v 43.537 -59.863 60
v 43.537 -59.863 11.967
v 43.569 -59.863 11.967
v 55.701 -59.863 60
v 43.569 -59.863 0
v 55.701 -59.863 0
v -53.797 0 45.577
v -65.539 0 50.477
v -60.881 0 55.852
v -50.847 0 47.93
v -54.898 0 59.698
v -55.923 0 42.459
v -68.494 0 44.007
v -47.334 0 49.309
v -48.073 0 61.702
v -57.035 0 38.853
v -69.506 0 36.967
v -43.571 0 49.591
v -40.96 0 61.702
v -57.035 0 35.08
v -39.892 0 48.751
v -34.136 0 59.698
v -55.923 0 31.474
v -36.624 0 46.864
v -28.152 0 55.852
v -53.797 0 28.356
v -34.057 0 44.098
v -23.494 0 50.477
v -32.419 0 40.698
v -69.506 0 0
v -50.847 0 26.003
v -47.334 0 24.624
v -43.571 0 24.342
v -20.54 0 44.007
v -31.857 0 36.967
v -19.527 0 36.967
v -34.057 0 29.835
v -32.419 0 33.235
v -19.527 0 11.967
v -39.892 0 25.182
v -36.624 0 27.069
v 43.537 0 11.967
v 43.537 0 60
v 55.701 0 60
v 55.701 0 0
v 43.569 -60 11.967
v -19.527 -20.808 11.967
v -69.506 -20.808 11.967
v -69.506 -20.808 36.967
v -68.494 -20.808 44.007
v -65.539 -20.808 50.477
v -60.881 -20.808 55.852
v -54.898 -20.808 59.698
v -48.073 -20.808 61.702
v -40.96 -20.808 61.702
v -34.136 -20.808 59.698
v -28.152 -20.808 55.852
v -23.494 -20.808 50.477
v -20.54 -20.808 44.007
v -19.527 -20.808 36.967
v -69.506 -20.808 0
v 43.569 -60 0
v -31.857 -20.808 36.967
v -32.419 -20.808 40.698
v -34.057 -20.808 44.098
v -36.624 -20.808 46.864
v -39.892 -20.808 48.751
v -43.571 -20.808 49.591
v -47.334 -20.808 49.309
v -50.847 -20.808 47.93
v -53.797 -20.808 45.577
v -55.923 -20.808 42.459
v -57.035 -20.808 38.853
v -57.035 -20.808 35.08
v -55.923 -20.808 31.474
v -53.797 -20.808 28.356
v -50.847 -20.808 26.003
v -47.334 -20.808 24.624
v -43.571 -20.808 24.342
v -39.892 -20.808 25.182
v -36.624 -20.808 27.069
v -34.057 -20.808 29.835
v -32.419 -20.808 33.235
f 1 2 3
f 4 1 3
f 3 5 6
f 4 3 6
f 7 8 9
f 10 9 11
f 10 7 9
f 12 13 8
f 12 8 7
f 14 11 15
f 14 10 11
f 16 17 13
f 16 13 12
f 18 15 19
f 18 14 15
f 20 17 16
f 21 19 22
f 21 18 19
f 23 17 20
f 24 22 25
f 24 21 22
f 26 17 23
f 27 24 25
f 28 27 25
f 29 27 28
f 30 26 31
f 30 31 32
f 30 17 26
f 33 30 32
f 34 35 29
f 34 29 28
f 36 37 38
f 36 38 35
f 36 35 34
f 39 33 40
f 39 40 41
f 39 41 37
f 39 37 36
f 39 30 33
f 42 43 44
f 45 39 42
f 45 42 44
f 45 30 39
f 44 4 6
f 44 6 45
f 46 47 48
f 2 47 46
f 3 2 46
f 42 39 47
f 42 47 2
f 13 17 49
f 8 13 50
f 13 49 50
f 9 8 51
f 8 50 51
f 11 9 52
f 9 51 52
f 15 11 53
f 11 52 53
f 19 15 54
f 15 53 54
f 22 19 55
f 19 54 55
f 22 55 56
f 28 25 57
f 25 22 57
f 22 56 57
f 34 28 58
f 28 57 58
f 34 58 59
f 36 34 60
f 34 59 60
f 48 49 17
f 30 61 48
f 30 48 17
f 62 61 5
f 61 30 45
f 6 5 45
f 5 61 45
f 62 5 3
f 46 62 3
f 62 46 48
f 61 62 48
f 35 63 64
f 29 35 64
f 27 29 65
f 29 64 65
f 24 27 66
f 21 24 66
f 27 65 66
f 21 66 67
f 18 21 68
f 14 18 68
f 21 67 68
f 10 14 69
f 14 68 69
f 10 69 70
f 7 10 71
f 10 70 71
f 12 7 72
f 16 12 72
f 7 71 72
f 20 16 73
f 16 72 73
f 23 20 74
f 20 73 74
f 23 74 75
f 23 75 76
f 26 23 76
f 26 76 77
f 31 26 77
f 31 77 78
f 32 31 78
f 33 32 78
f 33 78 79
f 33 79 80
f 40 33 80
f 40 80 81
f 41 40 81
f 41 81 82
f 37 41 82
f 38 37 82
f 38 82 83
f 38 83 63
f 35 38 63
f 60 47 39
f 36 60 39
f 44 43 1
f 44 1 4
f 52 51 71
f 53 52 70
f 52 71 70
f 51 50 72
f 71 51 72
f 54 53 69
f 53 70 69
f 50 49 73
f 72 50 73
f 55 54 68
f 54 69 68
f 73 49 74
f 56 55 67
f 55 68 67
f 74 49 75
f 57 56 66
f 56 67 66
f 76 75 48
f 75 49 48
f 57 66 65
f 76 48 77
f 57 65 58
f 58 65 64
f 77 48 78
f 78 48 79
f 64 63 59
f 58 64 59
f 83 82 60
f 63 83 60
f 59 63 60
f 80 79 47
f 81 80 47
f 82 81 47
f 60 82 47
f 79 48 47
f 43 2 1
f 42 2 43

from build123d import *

# Parameters (mm, degrees)
F0_W      = 113.0752004683
F0_H      = 11.9665954262
F1_DEPTH  = 60
F3_DEPTH  = 12
F5_W      = 12.1646374464
F5_H      = 59.8628073931
F6_DEPTH  = 60
F4_W      = 49.9786976725
F4_H      = 20.8079274744
F7_DEPTH  = 50
F9_DEPTH  = 21
F10_R     = 12.6598002667
F11_DEPTH = 21


with BuildPart() as f1:
    # F0 (on Front) → F1 (new body)
    with BuildSketch(Plane.XZ):
        with Locations((-12.968538329, 5.9832977131)):
            Rectangle(F0_W, F0_H)
    extrude(amount=F1_DEPTH)

    # F2 (on face) → F3 (cut)
    with BuildSketch(Plane.XY.offset(11.9665954262)):
        Polygon((43.5690619051, -60), (-69.5061385632, -20.8079274744), (-69.5061385632, -60), align=None)
    extrude(amount=-F3_DEPTH, mode=Mode.SUBTRACT)

    # F5 (on Top) → F6 (join)
    with BuildSketch(Plane.XY):
        with Locations((49.6189072728, -29.9314036965)):
            Rectangle(F5_W, F5_H)
    extrude(amount=F6_DEPTH)

    # F4 (on face) → F7 (join)
    with BuildSketch(Plane.XY.offset(11.9665954262)):
        with Locations((-44.5167897269, -10.4039637372)):
            Rectangle(F4_W, F4_H)
    extrude(amount=F7_DEPTH)

    # F8 (on face) → F9 (cut)
    with BuildSketch(Plane.XZ.offset(20.8079274744)):
        with BuildLine():
            ThreePointArc((-69.5061385632, 36.9665954262), (-44.5167897269, 61.9559442624), (-19.5274408907, 36.9665954262))
            Line((-19.5274408907, 36.9665954262), (-19.5274408907, 61.9665954262))
            Line((-19.5274408907, 61.9665954262), (-69.5061385632, 61.9665954262))
            Line((-69.5061385632, 61.9665954262), (-69.5061385632, 36.9665954262))
        make_face()
    extrude(amount=-F9_DEPTH, mode=Mode.SUBTRACT)

    # F10 (on face) → F11 (cut)
    with BuildSketch(Plane.XZ.offset(20.8079274744)):
        with Locations((-44.5167897269, 36.9665954262)):
            Circle(F10_R)
    extrude(amount=-F11_DEPTH, mode=Mode.SUBTRACT)


solid = f1.part
